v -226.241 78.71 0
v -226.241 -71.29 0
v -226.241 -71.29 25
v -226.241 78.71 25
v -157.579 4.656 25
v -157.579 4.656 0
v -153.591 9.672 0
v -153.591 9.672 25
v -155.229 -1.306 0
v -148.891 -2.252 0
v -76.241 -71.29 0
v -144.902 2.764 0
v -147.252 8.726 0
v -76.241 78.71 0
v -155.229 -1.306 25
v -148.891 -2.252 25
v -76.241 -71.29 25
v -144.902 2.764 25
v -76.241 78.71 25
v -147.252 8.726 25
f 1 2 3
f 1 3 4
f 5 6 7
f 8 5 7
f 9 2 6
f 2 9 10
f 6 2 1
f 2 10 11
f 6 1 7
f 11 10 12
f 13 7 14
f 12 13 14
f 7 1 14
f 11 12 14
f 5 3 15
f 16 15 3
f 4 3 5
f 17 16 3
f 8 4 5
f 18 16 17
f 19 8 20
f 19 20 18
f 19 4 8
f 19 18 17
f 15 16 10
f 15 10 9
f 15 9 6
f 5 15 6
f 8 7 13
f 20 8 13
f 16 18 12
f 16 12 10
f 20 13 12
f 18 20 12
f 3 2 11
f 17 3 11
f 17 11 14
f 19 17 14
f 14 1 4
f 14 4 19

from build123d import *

# Parameters (mm, degrees)
F0_W     = 150
F0_H     = 150
F1_DEPTH = 25


with BuildPart() as f1:
    # F0 (on Top) → F1 (new body)
    with BuildSketch(Plane.XY):
        with Locations((-151.240738, 3.709819)):
            Rectangle(F0_W, F0_H)
        Polygon((-153.590513, 9.67208), (-147.252156, 8.725914), (-144.902381, 2.763653), (-148.890964, -2.252442), (-155.229321, -1.306276), (-157.579095, 4.655985), align=None, mode=Mode.SUBTRACT)
    extrude(amount=F1_DEPTH)


solid = f1.part
